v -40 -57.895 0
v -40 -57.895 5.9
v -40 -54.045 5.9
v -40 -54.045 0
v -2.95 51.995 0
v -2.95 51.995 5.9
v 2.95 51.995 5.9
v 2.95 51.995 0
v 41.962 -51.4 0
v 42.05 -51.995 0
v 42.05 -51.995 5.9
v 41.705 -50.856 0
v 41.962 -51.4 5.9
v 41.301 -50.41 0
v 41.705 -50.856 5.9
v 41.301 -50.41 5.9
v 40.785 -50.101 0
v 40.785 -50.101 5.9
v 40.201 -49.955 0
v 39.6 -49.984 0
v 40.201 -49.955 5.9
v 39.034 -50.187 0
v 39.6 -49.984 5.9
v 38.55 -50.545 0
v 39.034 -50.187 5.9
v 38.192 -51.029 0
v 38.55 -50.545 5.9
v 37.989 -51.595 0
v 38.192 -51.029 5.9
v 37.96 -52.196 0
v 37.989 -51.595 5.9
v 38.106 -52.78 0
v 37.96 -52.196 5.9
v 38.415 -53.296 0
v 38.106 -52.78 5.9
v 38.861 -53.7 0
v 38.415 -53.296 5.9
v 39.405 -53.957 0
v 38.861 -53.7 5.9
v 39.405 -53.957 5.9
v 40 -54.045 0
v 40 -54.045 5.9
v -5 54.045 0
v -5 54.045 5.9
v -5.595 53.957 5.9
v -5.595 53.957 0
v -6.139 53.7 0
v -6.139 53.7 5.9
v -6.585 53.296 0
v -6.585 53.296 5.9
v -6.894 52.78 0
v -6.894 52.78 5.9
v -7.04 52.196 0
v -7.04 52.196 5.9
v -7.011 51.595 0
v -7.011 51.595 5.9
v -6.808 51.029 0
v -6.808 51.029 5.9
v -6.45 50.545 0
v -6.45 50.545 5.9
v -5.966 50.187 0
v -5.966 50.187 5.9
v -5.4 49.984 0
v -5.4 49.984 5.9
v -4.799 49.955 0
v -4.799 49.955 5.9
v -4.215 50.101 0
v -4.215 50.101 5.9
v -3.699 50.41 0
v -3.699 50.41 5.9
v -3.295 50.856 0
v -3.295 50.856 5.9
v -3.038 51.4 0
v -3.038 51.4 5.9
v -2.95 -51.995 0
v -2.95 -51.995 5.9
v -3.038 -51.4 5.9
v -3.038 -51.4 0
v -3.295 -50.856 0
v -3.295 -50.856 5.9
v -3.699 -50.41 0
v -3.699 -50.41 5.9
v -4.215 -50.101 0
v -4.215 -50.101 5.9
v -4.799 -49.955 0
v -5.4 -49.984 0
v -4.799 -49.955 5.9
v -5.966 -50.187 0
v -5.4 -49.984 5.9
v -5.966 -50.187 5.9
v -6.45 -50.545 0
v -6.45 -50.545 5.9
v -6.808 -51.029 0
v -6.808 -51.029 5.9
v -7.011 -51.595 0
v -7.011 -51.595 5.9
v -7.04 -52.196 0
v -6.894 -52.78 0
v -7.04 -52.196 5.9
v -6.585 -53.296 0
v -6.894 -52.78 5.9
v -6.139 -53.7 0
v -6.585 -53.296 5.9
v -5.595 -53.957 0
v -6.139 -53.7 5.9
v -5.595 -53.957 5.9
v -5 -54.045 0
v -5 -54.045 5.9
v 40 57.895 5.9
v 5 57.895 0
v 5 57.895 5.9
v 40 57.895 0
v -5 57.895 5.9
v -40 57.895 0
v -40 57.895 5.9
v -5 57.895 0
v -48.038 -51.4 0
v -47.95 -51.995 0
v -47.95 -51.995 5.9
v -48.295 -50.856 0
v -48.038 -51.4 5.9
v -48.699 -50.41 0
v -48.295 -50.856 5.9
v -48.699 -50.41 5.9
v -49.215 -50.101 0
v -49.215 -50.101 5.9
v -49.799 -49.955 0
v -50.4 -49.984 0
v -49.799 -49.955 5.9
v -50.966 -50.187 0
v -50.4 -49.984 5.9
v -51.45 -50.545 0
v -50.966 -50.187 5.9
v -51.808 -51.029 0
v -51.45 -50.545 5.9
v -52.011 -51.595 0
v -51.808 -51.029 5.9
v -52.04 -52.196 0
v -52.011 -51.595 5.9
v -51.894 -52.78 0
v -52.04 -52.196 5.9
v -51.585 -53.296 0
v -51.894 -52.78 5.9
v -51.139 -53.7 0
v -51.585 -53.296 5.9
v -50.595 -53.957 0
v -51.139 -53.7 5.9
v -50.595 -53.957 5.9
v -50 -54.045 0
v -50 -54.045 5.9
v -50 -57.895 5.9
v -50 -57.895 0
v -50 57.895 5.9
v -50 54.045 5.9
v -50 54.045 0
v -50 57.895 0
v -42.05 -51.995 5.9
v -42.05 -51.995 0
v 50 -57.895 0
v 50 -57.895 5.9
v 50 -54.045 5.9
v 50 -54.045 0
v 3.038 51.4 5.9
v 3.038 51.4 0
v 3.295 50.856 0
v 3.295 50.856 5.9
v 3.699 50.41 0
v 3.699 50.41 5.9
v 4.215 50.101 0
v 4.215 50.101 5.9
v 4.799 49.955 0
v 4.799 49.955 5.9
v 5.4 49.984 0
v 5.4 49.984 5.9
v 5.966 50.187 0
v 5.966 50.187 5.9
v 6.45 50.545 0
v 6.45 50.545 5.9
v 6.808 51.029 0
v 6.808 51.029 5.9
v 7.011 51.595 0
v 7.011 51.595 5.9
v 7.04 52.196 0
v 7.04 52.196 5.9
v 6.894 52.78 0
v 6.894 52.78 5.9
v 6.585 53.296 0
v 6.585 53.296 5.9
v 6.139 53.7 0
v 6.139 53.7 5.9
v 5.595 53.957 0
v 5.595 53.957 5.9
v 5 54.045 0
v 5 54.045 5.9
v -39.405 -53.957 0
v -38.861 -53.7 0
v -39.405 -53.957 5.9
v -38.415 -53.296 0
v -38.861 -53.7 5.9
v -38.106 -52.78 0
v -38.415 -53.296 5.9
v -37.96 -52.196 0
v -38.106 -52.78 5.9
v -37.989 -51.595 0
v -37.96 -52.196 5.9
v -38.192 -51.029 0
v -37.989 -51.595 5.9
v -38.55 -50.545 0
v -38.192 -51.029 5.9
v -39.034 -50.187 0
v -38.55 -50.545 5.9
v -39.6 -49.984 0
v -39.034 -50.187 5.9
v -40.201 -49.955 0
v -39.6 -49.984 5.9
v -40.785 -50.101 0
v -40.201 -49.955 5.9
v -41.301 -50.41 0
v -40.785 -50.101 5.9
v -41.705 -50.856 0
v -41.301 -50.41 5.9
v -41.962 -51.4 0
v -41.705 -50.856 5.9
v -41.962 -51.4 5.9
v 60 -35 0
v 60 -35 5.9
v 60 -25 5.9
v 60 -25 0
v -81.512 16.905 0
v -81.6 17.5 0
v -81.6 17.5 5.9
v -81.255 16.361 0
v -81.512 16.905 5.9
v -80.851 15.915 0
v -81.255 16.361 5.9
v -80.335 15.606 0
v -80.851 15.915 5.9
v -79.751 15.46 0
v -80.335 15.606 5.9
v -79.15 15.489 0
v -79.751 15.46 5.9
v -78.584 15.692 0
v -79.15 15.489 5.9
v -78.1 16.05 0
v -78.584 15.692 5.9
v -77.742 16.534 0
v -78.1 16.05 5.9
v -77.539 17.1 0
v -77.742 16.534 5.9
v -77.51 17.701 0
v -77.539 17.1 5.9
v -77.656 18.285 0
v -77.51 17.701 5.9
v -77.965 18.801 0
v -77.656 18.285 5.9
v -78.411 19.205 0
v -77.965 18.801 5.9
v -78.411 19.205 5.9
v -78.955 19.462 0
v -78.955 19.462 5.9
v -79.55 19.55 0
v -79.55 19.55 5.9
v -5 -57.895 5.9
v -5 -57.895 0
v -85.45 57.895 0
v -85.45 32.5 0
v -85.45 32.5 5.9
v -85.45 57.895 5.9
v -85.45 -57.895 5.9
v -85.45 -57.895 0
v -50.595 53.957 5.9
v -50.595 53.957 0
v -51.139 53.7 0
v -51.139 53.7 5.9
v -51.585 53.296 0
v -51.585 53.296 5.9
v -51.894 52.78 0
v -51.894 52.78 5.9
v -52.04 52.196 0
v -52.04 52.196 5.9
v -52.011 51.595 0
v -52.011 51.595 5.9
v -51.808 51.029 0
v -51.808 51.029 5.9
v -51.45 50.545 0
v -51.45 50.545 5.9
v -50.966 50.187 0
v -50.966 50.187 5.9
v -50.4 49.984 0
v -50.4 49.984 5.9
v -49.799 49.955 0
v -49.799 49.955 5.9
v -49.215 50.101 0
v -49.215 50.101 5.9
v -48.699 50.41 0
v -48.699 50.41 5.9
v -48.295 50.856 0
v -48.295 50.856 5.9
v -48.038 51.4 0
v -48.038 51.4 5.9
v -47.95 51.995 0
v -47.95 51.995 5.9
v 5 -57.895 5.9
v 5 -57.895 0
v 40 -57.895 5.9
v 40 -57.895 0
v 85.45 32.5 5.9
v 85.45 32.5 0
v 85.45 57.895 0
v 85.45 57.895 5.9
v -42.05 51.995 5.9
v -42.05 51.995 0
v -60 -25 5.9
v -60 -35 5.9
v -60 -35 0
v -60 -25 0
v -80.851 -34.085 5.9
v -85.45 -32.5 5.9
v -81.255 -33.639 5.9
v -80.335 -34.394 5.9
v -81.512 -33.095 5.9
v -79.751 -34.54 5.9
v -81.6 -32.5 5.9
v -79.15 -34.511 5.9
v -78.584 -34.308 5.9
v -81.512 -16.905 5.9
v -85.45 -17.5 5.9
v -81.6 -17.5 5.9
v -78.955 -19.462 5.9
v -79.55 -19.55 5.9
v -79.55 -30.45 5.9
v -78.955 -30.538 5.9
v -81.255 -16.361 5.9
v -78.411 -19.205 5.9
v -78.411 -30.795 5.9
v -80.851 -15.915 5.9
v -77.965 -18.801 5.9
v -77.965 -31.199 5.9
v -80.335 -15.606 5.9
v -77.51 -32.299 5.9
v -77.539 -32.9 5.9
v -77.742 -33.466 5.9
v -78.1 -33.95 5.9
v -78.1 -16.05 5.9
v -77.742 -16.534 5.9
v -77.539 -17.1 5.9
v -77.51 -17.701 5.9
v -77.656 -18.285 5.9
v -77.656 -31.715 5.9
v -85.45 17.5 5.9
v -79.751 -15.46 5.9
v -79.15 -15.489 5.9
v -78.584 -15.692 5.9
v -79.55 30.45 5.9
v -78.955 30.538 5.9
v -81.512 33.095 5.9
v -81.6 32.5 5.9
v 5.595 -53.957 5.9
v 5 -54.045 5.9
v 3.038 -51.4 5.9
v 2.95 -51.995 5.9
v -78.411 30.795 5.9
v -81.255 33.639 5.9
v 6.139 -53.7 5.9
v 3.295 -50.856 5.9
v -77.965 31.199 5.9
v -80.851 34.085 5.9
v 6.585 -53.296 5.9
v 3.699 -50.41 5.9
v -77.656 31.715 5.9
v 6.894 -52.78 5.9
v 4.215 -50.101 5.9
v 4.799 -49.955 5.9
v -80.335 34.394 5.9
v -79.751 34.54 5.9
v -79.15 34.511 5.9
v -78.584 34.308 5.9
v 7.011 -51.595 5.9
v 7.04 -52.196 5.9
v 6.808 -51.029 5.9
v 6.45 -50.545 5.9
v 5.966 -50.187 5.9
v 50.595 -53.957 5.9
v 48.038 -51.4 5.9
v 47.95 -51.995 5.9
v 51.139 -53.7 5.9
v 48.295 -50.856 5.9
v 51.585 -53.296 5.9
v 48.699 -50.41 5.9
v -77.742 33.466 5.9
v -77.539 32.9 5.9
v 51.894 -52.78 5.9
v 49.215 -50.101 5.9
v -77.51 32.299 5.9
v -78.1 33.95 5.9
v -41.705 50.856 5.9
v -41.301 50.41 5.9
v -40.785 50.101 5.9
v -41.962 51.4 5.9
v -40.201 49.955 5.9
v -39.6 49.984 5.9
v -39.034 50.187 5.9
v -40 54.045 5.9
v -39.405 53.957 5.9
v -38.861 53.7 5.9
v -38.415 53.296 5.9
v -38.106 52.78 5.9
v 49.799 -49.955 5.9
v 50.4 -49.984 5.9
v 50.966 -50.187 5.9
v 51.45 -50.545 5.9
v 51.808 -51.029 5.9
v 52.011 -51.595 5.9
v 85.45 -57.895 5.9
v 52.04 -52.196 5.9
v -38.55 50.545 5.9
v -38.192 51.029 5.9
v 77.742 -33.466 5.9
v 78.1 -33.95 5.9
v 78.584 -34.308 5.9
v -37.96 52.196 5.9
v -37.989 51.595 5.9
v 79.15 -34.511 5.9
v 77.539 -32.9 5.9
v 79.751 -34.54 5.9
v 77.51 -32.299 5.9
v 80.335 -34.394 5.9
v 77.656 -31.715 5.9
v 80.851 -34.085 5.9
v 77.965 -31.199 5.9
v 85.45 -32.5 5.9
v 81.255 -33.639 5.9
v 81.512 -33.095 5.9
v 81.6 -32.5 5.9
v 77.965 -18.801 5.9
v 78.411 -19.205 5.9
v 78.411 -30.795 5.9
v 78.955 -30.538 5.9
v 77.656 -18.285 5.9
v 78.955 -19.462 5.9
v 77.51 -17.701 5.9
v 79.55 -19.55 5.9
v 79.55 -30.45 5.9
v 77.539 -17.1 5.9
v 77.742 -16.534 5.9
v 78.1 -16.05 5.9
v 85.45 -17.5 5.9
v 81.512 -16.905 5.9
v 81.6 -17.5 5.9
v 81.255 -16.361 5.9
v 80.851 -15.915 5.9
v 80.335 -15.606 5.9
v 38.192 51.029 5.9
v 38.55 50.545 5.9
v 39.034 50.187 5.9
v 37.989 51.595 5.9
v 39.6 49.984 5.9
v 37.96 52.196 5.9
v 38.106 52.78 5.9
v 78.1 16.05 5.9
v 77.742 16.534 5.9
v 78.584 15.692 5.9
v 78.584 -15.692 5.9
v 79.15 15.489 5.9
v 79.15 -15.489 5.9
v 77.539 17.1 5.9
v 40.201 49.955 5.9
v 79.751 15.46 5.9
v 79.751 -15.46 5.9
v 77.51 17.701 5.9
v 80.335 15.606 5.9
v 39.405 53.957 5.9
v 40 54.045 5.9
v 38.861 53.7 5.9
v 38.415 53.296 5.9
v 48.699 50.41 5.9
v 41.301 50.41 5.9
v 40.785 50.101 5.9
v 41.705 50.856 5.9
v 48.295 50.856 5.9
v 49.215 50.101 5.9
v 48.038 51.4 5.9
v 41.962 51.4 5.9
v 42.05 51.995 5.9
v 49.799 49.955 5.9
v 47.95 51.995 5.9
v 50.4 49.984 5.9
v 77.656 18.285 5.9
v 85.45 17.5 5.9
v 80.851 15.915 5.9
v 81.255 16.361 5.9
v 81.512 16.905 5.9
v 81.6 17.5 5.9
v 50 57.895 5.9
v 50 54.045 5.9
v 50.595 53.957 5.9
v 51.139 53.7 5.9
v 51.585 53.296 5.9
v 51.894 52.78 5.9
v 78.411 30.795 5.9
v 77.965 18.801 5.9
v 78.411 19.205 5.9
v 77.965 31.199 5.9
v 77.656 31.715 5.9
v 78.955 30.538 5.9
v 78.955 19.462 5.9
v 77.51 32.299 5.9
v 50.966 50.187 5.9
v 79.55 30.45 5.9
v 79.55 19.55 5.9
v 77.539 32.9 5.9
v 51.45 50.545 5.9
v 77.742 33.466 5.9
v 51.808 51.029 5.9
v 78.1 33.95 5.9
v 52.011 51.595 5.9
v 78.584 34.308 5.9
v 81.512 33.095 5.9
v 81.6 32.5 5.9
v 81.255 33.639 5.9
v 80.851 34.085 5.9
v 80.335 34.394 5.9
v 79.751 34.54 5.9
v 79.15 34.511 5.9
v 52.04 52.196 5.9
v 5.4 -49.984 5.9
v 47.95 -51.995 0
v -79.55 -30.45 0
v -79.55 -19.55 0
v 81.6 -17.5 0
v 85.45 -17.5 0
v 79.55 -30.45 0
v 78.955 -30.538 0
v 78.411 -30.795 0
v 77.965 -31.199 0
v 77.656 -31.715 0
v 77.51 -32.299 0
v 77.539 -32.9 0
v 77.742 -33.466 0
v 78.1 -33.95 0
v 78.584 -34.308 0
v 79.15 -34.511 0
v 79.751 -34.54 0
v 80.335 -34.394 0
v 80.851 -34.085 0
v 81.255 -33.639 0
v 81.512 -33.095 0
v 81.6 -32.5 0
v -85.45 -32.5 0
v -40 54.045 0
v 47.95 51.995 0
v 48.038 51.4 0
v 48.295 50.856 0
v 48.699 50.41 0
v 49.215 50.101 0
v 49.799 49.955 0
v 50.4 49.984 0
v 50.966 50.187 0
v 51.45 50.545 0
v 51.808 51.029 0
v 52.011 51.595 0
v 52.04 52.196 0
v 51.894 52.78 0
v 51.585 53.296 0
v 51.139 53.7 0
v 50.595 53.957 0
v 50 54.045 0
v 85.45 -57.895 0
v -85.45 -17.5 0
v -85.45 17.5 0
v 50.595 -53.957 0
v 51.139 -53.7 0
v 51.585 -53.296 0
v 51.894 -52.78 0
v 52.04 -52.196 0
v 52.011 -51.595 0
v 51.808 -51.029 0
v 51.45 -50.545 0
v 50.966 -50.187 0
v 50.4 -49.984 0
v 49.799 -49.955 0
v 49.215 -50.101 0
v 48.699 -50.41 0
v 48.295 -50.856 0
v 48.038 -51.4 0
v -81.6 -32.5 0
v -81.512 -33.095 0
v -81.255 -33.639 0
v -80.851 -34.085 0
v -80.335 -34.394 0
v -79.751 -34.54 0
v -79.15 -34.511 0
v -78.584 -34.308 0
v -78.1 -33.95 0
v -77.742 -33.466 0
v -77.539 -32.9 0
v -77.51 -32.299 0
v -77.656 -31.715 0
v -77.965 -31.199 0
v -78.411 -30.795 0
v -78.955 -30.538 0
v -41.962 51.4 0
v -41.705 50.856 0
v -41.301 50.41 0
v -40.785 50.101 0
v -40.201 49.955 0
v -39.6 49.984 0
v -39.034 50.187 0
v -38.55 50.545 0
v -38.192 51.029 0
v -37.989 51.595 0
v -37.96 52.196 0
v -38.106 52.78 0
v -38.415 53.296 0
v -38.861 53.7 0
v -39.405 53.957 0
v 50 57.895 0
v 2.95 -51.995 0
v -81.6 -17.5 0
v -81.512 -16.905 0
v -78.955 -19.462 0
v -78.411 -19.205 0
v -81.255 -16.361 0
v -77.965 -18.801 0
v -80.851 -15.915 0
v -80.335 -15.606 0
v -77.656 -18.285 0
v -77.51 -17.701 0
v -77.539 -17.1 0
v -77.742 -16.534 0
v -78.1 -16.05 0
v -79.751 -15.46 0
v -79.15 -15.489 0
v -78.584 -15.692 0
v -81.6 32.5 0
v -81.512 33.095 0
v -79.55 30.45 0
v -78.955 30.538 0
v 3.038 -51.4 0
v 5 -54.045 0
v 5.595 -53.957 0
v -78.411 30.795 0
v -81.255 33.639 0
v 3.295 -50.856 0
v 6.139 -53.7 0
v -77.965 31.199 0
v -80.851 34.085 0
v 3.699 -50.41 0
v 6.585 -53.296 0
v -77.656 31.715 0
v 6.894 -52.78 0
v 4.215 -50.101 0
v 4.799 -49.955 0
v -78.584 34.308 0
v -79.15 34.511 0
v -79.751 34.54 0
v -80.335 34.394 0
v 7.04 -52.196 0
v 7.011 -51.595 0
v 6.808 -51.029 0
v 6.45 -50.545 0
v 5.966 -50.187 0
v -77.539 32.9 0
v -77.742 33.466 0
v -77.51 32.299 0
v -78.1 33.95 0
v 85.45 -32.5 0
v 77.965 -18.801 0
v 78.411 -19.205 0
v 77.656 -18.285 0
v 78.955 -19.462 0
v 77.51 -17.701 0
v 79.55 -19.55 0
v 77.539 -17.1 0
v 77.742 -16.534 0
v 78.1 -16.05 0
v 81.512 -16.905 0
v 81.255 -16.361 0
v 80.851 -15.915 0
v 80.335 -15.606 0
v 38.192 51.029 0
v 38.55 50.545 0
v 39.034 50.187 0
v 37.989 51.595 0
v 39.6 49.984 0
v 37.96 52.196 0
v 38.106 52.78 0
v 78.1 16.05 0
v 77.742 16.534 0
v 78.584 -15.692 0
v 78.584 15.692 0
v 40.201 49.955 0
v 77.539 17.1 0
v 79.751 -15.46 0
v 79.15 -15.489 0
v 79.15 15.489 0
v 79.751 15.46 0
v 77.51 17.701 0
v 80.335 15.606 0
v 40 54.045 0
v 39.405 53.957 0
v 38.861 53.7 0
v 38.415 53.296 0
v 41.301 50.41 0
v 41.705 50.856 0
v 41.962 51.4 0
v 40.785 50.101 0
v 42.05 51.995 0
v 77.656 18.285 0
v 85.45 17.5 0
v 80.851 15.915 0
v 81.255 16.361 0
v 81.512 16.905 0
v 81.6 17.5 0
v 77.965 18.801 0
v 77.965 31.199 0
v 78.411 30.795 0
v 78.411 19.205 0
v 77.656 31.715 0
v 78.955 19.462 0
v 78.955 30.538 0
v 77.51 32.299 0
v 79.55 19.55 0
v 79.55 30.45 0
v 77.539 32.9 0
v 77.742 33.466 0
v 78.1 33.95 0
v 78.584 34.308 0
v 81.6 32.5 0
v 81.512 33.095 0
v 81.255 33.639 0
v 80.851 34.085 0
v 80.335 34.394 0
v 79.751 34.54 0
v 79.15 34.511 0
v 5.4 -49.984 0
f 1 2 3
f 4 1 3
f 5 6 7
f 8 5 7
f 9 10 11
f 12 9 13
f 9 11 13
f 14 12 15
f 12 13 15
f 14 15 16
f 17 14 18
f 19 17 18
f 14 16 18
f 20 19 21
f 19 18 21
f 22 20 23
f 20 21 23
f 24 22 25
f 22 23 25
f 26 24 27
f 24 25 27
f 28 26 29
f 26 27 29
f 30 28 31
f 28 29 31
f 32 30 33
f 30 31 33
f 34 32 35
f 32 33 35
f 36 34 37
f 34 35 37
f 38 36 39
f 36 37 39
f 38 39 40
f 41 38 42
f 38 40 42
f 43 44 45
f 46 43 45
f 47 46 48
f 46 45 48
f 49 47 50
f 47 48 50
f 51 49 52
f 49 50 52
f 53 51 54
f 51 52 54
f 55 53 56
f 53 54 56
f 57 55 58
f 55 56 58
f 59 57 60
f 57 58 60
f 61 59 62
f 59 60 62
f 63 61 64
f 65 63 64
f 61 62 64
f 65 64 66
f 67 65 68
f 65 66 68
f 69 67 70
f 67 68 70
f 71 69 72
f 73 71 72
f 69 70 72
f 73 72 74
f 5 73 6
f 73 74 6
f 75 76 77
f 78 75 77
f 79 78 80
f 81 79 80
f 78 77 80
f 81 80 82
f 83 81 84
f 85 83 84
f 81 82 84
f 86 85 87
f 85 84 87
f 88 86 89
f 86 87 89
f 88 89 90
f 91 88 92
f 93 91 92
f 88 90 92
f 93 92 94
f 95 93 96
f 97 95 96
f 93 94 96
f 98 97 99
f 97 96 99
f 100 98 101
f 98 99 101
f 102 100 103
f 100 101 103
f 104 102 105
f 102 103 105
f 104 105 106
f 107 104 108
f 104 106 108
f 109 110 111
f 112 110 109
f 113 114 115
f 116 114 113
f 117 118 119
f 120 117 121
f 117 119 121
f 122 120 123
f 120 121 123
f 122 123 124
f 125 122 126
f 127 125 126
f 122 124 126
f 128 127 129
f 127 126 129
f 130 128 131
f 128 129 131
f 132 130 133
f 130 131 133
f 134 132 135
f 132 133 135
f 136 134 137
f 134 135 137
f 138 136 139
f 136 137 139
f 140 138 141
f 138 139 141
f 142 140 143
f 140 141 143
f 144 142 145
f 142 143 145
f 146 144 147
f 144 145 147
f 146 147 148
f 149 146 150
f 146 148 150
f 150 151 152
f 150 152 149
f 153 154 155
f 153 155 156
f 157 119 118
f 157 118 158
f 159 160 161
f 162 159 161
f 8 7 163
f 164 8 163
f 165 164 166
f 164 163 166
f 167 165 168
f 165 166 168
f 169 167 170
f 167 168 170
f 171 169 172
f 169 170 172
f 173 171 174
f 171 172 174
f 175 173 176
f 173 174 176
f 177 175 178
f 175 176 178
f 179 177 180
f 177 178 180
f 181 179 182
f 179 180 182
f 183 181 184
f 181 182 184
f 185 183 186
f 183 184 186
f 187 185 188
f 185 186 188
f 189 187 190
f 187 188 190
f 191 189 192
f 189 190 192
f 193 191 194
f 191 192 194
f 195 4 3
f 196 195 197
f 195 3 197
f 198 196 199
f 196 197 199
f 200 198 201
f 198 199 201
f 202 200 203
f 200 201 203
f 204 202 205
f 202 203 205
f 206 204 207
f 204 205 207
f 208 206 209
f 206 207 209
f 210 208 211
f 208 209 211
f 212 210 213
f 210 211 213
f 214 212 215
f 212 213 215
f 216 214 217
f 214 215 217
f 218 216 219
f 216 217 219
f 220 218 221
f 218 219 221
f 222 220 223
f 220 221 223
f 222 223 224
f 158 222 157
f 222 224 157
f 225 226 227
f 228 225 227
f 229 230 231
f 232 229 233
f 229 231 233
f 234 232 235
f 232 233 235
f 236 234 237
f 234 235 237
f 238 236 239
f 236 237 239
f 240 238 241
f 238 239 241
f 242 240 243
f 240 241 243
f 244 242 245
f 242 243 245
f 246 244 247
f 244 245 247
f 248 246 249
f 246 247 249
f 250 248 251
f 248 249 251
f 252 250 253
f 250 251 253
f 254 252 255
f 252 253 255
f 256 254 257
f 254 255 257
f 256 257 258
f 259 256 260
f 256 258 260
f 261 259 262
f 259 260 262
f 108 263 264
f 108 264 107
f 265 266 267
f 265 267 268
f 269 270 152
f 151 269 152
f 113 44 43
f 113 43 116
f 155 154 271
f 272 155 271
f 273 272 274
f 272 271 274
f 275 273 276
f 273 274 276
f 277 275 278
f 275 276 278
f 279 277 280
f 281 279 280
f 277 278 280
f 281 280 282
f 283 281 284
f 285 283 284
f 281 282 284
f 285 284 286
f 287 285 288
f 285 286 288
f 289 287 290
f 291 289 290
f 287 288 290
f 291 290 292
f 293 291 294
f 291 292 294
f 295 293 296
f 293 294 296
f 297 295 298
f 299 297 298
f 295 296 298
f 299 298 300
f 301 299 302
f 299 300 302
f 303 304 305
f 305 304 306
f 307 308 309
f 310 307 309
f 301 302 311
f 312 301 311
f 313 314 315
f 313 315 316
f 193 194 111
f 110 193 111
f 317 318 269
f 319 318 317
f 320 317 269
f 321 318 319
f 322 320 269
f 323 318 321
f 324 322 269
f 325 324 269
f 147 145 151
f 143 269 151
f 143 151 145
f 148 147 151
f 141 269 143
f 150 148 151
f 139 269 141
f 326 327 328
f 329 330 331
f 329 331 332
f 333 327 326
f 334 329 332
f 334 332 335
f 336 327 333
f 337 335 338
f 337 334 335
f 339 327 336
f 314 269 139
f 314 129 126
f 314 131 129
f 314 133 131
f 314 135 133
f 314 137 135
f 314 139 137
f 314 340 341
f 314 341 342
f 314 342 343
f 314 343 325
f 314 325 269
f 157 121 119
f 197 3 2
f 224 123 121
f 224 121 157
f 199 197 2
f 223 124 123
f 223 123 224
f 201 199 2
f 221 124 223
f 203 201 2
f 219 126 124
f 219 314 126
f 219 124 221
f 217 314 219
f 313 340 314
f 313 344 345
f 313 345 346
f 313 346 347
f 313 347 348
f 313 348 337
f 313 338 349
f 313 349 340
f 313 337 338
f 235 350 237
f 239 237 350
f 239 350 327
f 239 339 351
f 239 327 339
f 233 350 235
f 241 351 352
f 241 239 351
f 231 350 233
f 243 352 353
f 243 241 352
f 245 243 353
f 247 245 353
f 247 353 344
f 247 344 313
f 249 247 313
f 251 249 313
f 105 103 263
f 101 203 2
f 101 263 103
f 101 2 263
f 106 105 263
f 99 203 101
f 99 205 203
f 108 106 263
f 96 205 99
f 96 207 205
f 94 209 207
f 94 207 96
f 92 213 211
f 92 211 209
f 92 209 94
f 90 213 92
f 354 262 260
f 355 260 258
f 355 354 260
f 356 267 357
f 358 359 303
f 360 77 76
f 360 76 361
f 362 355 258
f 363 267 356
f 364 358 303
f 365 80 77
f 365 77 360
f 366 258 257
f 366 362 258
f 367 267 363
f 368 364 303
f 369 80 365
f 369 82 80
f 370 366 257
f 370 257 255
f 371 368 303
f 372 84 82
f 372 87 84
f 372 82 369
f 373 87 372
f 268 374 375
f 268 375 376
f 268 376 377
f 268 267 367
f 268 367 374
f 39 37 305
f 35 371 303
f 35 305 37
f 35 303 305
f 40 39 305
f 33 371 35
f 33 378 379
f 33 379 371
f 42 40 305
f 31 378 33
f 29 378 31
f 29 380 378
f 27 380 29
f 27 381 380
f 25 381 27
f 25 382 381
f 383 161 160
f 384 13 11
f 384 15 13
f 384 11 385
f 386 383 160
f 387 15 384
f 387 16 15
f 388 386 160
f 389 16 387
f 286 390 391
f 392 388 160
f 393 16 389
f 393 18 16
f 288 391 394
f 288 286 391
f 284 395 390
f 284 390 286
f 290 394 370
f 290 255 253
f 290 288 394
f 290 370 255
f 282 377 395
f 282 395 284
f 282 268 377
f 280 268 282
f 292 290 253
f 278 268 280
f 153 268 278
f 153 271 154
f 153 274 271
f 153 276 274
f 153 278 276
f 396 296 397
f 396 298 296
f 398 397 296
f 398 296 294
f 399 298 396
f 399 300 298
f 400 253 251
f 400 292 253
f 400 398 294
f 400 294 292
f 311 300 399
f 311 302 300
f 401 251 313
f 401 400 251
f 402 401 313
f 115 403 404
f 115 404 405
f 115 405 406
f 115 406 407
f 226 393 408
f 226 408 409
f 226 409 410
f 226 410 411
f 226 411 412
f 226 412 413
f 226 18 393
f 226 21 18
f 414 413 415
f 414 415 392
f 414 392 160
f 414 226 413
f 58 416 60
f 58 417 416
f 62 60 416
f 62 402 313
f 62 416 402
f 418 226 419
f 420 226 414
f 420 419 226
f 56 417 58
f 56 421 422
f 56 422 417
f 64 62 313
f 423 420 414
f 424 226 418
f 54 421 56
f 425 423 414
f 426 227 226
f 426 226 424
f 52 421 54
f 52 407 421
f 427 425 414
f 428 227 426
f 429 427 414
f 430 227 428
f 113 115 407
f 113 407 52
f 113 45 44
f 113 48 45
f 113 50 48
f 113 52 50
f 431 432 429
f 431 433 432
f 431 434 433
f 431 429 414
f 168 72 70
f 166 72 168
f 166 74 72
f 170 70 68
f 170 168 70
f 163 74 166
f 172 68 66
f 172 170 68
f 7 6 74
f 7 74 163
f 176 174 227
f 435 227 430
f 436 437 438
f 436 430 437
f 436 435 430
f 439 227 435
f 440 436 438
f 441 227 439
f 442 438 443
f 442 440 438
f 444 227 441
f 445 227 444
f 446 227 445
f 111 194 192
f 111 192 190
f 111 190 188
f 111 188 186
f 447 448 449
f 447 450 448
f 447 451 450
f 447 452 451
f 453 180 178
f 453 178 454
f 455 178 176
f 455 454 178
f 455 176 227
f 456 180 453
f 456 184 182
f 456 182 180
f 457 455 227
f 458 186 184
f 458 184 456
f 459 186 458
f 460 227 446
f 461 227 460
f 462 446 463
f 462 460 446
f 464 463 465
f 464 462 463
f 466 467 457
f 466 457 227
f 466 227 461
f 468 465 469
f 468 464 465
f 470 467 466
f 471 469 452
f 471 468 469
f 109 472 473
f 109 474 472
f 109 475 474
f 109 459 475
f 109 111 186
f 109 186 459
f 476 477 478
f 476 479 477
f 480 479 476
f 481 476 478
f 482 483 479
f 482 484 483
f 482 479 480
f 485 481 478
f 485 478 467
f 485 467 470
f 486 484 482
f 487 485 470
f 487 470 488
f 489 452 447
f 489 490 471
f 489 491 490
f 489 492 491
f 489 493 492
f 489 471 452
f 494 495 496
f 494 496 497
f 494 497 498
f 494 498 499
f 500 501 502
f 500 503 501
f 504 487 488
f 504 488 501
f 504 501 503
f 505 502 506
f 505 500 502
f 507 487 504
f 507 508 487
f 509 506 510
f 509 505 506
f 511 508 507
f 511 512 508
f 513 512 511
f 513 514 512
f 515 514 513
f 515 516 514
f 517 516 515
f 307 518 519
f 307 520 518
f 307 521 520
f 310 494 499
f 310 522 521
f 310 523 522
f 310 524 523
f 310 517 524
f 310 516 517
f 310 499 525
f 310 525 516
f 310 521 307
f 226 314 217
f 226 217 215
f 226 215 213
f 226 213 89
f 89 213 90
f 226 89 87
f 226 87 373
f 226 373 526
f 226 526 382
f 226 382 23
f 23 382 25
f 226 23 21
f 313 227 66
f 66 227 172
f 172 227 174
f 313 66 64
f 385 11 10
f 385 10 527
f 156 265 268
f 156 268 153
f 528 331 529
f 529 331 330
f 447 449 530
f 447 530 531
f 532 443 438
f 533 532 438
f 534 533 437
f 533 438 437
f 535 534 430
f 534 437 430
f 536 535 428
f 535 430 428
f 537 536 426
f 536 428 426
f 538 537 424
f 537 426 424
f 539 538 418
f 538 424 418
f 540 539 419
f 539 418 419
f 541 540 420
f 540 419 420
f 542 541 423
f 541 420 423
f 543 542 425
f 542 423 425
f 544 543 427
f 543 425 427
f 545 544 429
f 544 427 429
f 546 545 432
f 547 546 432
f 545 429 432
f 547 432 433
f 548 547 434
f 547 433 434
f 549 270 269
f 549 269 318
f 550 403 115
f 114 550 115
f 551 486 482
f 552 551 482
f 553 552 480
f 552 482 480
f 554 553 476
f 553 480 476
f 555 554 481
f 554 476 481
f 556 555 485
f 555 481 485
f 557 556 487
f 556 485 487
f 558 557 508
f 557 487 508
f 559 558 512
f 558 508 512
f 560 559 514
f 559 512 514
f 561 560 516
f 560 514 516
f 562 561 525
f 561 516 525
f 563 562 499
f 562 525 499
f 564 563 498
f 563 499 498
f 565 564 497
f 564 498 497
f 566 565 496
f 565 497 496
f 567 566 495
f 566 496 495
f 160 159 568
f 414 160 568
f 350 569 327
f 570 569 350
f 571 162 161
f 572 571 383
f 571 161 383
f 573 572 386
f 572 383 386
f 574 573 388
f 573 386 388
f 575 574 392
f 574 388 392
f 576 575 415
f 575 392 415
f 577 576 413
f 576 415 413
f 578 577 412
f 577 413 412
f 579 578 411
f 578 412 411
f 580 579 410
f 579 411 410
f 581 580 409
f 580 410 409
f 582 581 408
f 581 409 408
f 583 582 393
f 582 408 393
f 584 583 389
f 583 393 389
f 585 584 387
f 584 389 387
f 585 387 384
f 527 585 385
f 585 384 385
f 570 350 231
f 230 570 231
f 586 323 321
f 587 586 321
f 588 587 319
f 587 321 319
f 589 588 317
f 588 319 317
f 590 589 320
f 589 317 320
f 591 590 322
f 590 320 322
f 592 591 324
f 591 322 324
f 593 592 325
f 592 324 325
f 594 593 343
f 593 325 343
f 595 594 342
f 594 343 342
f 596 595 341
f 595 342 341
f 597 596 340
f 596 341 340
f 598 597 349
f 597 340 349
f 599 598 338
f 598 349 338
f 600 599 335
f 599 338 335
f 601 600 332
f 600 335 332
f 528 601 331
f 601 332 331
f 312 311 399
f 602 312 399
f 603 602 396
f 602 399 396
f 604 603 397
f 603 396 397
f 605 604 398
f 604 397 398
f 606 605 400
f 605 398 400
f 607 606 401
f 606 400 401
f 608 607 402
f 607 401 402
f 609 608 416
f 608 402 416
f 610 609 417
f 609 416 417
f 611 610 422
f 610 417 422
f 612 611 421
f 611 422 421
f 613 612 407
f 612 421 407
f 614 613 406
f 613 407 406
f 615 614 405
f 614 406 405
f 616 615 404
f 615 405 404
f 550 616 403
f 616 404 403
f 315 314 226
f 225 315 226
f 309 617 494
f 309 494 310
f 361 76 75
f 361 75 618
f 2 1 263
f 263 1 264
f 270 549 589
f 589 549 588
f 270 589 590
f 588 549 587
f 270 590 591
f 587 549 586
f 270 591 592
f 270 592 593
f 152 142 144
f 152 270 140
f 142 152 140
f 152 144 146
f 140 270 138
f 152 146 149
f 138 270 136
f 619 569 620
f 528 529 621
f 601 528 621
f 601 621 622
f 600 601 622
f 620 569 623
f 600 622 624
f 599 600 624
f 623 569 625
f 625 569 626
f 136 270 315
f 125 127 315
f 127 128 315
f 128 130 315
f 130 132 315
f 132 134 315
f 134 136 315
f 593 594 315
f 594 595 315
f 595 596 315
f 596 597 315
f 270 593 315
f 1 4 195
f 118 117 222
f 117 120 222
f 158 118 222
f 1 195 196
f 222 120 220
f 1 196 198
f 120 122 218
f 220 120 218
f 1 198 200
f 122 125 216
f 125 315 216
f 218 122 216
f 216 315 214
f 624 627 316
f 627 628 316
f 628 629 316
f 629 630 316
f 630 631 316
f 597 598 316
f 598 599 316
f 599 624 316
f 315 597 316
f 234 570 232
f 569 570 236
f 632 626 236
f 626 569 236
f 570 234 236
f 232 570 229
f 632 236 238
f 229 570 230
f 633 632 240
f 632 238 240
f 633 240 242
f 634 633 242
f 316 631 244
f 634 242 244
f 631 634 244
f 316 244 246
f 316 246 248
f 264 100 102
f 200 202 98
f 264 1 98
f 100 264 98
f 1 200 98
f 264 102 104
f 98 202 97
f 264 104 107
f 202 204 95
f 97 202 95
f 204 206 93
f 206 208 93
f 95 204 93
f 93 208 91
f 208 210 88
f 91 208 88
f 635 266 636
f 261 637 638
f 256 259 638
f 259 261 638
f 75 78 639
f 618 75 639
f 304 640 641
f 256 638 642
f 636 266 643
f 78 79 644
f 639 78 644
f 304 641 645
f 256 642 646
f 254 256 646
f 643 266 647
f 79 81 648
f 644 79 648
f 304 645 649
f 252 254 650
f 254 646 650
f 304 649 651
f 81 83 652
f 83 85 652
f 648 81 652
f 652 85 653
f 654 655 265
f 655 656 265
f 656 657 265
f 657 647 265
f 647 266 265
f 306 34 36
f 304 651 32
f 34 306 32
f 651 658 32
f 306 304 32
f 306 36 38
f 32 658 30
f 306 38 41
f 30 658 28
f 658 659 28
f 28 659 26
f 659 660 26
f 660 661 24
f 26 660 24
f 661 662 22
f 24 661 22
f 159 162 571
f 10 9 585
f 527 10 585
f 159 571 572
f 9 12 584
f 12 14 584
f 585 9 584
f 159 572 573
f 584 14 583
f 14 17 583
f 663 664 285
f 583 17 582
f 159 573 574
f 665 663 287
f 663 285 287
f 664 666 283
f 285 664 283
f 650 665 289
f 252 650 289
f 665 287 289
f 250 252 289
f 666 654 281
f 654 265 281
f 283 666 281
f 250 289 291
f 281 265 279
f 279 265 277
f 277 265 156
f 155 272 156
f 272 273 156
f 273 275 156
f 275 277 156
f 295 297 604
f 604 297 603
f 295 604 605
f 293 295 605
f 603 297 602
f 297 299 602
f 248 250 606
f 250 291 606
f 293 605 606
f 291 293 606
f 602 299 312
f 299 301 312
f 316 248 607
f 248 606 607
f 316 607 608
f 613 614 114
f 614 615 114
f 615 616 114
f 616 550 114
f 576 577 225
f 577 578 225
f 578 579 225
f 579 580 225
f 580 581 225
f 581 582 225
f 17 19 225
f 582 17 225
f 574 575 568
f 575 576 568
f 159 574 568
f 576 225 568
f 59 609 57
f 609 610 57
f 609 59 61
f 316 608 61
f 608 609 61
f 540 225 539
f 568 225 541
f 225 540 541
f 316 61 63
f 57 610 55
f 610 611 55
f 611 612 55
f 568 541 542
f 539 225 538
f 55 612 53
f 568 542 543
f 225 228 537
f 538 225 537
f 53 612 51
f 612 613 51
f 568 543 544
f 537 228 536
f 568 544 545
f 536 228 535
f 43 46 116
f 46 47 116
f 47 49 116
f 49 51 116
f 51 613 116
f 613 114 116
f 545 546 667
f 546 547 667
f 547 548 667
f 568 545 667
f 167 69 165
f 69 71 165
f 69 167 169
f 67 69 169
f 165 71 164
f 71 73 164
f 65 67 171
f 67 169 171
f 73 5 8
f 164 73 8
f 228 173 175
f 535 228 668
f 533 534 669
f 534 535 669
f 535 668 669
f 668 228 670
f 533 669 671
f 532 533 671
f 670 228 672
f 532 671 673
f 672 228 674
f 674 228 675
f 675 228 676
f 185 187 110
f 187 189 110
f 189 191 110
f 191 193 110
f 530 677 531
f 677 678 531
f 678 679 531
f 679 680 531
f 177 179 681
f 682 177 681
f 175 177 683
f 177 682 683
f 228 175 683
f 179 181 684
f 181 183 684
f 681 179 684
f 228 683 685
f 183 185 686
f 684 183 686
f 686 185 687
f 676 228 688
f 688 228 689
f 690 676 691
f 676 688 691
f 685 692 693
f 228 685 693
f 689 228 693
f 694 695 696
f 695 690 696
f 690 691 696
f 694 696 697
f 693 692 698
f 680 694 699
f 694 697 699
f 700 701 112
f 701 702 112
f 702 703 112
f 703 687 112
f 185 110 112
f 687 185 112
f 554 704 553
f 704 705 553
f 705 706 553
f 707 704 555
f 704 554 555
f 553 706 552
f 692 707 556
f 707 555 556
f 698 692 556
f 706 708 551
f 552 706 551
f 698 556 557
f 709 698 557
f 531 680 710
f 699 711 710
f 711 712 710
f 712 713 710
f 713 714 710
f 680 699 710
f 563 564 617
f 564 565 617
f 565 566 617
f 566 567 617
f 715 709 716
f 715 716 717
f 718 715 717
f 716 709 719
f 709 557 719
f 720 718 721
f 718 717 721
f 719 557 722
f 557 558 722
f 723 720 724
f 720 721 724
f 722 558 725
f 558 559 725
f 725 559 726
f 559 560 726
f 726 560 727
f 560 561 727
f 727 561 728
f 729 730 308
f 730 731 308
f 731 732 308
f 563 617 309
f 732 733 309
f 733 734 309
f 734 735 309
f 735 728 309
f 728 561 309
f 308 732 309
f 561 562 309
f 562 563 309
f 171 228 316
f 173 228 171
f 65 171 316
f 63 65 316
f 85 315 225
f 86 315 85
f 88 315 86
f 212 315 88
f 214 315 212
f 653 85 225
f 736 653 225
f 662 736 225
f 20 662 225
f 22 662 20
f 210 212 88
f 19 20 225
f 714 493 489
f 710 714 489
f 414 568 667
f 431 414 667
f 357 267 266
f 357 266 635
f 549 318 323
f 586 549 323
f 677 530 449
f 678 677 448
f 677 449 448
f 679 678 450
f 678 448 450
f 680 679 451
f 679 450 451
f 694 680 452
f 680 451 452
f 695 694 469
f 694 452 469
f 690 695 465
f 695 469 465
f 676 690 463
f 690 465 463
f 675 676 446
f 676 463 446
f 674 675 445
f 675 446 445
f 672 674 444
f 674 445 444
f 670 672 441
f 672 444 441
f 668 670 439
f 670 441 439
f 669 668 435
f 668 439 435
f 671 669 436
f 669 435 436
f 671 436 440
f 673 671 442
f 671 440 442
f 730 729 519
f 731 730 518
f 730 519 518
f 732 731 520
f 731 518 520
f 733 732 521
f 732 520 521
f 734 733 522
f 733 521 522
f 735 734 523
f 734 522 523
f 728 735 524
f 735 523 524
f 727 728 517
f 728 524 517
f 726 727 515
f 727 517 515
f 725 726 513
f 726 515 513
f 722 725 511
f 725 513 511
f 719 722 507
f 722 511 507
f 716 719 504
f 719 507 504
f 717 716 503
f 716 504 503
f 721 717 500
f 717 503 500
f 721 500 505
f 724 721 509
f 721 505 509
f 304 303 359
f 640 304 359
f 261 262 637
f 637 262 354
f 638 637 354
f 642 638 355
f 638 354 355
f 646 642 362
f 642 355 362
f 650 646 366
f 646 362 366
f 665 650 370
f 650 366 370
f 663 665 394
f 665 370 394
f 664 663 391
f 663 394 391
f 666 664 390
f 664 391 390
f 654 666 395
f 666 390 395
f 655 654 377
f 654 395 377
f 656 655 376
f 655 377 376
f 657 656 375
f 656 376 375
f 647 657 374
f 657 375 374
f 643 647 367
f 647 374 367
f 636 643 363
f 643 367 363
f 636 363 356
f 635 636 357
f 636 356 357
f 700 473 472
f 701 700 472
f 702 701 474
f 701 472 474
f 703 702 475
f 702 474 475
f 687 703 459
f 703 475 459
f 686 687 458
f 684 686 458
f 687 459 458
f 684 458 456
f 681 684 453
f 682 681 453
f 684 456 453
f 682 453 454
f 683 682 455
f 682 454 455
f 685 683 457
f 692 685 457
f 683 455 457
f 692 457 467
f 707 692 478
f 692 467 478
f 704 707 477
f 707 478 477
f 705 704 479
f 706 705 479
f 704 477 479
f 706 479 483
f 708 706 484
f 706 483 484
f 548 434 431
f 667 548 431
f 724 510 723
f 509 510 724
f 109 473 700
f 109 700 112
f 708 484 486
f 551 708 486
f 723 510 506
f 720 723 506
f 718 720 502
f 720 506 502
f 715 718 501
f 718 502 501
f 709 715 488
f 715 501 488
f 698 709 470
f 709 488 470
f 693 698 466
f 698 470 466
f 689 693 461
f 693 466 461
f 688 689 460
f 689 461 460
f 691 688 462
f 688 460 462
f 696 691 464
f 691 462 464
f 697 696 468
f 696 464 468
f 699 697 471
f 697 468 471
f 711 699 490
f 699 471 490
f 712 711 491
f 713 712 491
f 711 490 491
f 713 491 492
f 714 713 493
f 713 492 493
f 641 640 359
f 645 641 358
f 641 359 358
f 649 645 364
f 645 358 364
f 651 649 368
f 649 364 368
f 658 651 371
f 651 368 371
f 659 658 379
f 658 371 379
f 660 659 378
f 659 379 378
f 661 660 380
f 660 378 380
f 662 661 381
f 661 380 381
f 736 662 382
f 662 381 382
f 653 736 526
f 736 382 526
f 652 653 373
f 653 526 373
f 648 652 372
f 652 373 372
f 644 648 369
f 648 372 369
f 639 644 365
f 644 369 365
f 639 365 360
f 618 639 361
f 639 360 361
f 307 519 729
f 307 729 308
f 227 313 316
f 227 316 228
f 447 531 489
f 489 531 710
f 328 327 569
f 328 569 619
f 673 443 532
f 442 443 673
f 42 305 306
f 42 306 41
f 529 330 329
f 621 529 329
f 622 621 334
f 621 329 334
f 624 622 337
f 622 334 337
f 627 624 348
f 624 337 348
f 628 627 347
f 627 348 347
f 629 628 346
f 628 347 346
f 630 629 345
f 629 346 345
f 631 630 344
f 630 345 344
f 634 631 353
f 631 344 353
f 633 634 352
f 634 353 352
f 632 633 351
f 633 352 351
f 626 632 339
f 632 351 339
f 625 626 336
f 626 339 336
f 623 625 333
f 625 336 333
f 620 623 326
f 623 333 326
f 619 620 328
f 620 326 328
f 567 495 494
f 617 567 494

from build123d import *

# Parameters (mm, degrees)
SKETCH1_W           = 170.9
SKETCH1_H           = 115.79
BOSS_EXTRUDE1_DEPTH = 5.9
SKETCH2_W           = 5.9
SKETCH2_H           = 15
SKETCH2_W_2         = 10
SKETCH2_H_2         = 5.9
CUT_EXTRUDE1_DEPTH  = 6.9
CUT_EXTRUDE2_REACH  = 7.9
SKETCH4_W           = 120
SKETCH4_H           = 10
CUT_EXTRUDE3_REACH  = 7.9
SKETCH5_R           = 2.05


with BuildPart() as part:
    # Sketch1 → Boss-Extrude1 (new body)
    with BuildSketch(Plane.XY):
        Rectangle(SKETCH1_W, SKETCH1_H)
    extrude(amount=BOSS_EXTRUDE1_DEPTH)

    # Sketch2 → Cut-Extrude1 (cut, through all)
    with BuildSketch(Plane.XY.offset(5.9)):
        with Locations((-82.5, 25)):
            Rectangle(SKETCH2_W, SKETCH2_H)
        with Locations((-82.5, -25)):
            Rectangle(SKETCH2_W, SKETCH2_H)
        with Locations((82.5, -25)):
            Rectangle(SKETCH2_W, SKETCH2_H)
        with Locations((82.5, 25)):
            Rectangle(SKETCH2_W, SKETCH2_H)
        with Locations((-45, 54.945)):
            Rectangle(SKETCH2_W_2, SKETCH2_H_2)
        with Locations((0, 54.945)):
            Rectangle(SKETCH2_W_2, SKETCH2_H_2)
        with Locations((45, 54.945)):
            Rectangle(SKETCH2_W_2, SKETCH2_H_2)
        with Locations((45, -54.945)):
            Rectangle(SKETCH2_W_2, SKETCH2_H_2)
        with Locations((0, -54.945)):
            Rectangle(SKETCH2_W_2, SKETCH2_H_2)
        with Locations((-45, -54.945)):
            Rectangle(SKETCH2_W_2, SKETCH2_H_2)
    extrude(amount=-CUT_EXTRUDE1_DEPTH, mode=Mode.SUBTRACT)

    # Sketch4 → Cut-Extrude2 (cut, up to next)
    with BuildSketch(Plane.XY.offset(5.9), mode=Mode.PRIVATE) as cut_extrude2_sk1:
        with Locations((0, -30)):
            Rectangle(SKETCH4_W, SKETCH4_H)
    cut_extrude2_tool1 = extrude(cut_extrude2_sk1.sketch, amount=-CUT_EXTRUDE2_REACH, mode=Mode.PRIVATE) & part.part
    add(cut_extrude2_tool1.solids().sort_by_distance((0, -30, 5.9))[0], mode=Mode.SUBTRACT)

    # Sketch5 → Cut-Extrude3 (cut, up to next)
    with BuildSketch(Plane.XY.offset(5.9), mode=Mode.PRIVATE) as cut_extrude3_sk1:
        with Locations((-50, 51.995)):
            Circle(SKETCH5_R)
    cut_extrude3_tool1 = extrude(cut_extrude3_sk1.sketch, amount=-CUT_EXTRUDE3_REACH, mode=Mode.PRIVATE) & part.part
    add(cut_extrude3_tool1.solids().sort_by_distance((-50, 51.995, 5.9))[0], mode=Mode.SUBTRACT)
    # Sketch5 → Cut-Extrude3 (cut, up to next)
    with BuildSketch(Plane.XY.offset(5.9), mode=Mode.PRIVATE) as cut_extrude3_sk2:
        with Locations((-40, 51.995)):
            Circle(SKETCH5_R)
    cut_extrude3_tool2 = extrude(cut_extrude3_sk2.sketch, amount=-CUT_EXTRUDE3_REACH, mode=Mode.PRIVATE) & part.part
    add(cut_extrude3_tool2.solids().sort_by_distance((-40, 51.995, 5.9))[0], mode=Mode.SUBTRACT)
    # Sketch5 → Cut-Extrude3 (cut, up to next)
    with BuildSketch(Plane.XY.offset(5.9), mode=Mode.PRIVATE) as cut_extrude3_sk3:
        with Locations((-5, 51.995)):
            Circle(SKETCH5_R)
    cut_extrude3_tool3 = extrude(cut_extrude3_sk3.sketch, amount=-CUT_EXTRUDE3_REACH, mode=Mode.PRIVATE) & part.part
    add(cut_extrude3_tool3.solids().sort_by_distance((-5, 51.995, 5.9))[0], mode=Mode.SUBTRACT)
    # Sketch5 → Cut-Extrude3 (cut, up to next)
    with BuildSketch(Plane.XY.offset(5.9), mode=Mode.PRIVATE) as cut_extrude3_sk4:
        with Locations((5, 51.995)):
            Circle(SKETCH5_R)
    cut_extrude3_tool4 = extrude(cut_extrude3_sk4.sketch, amount=-CUT_EXTRUDE3_REACH, mode=Mode.PRIVATE) & part.part
    add(cut_extrude3_tool4.solids().sort_by_distance((5, 51.995, 5.9))[0], mode=Mode.SUBTRACT)
    # Sketch5 → Cut-Extrude3 (cut, up to next)
    with BuildSketch(Plane.XY.offset(5.9), mode=Mode.PRIVATE) as cut_extrude3_sk5:
        with Locations((40, 51.995)):
            Circle(SKETCH5_R)
    cut_extrude3_tool5 = extrude(cut_extrude3_sk5.sketch, amount=-CUT_EXTRUDE3_REACH, mode=Mode.PRIVATE) & part.part
    add(cut_extrude3_tool5.solids().sort_by_distance((40, 51.995, 5.9))[0], mode=Mode.SUBTRACT)
    # Sketch5 → Cut-Extrude3 (cut, up to next)
    with BuildSketch(Plane.XY.offset(5.9), mode=Mode.PRIVATE) as cut_extrude3_sk6:
        with Locations((50, 51.995)):
            Circle(SKETCH5_R)
    cut_extrude3_tool6 = extrude(cut_extrude3_sk6.sketch, amount=-CUT_EXTRUDE3_REACH, mode=Mode.PRIVATE) & part.part
    add(cut_extrude3_tool6.solids().sort_by_distance((50, 51.995, 5.9))[0], mode=Mode.SUBTRACT)
    # Sketch5 → Cut-Extrude3 (cut, up to next)
    with BuildSketch(Plane.XY.offset(5.9), mode=Mode.PRIVATE) as cut_extrude3_sk7:
        with Locations((79.55, 32.5)):
            Circle(SKETCH5_R)
    cut_extrude3_tool7 = extrude(cut_extrude3_sk7.sketch, amount=-CUT_EXTRUDE3_REACH, mode=Mode.PRIVATE) & part.part
    add(cut_extrude3_tool7.solids().sort_by_distance((79.55, 32.5, 5.9))[0], mode=Mode.SUBTRACT)
    # Sketch5 → Cut-Extrude3 (cut, up to next)
    with BuildSketch(Plane.XY.offset(5.9), mode=Mode.PRIVATE) as cut_extrude3_sk8:
        with Locations((79.55, 17.5)):
            Circle(SKETCH5_R)
    cut_extrude3_tool8 = extrude(cut_extrude3_sk8.sketch, amount=-CUT_EXTRUDE3_REACH, mode=Mode.PRIVATE) & part.part
    add(cut_extrude3_tool8.solids().sort_by_distance((79.55, 17.5, 5.9))[0], mode=Mode.SUBTRACT)
    # Sketch5 → Cut-Extrude3 (cut, up to next)
    with BuildSketch(Plane.XY.offset(5.9), mode=Mode.PRIVATE) as cut_extrude3_sk9:
        with Locations((79.55, -17.5)):
            Circle(SKETCH5_R)
    cut_extrude3_tool9 = extrude(cut_extrude3_sk9.sketch, amount=-CUT_EXTRUDE3_REACH, mode=Mode.PRIVATE) & part.part
    add(cut_extrude3_tool9.solids().sort_by_distance((79.55, -17.5, 5.9))[0], mode=Mode.SUBTRACT)
    # Sketch5 → Cut-Extrude3 (cut, up to next)
    with BuildSketch(Plane.XY.offset(5.9), mode=Mode.PRIVATE) as cut_extrude3_sk10:
        with Locations((79.55, -32.5)):
            Circle(SKETCH5_R)
    cut_extrude3_tool10 = extrude(cut_extrude3_sk10.sketch, amount=-CUT_EXTRUDE3_REACH, mode=Mode.PRIVATE) & part.part
    add(cut_extrude3_tool10.solids().sort_by_distance((79.55, -32.5, 5.9))[0], mode=Mode.SUBTRACT)
    # Sketch5 → Cut-Extrude3 (cut, up to next)
    with BuildSketch(Plane.XY.offset(5.9), mode=Mode.PRIVATE) as cut_extrude3_sk11:
        with Locations((-40, -51.995)):
            Circle(SKETCH5_R)
    cut_extrude3_tool11 = extrude(cut_extrude3_sk11.sketch, amount=-CUT_EXTRUDE3_REACH, mode=Mode.PRIVATE) & part.part
    add(cut_extrude3_tool11.solids().sort_by_distance((-40, -51.995, 5.9))[0], mode=Mode.SUBTRACT)
    # Sketch5 → Cut-Extrude3 (cut, up to next)
    with BuildSketch(Plane.XY.offset(5.9), mode=Mode.PRIVATE) as cut_extrude3_sk12:
        with Locations((-5, -51.995)):
            Circle(SKETCH5_R)
    cut_extrude3_tool12 = extrude(cut_extrude3_sk12.sketch, amount=-CUT_EXTRUDE3_REACH, mode=Mode.PRIVATE) & part.part
    add(cut_extrude3_tool12.solids().sort_by_distance((-5, -51.995, 5.9))[0], mode=Mode.SUBTRACT)
    # Sketch5 → Cut-Extrude3 (cut, up to next)
    with BuildSketch(Plane.XY.offset(5.9), mode=Mode.PRIVATE) as cut_extrude3_sk13:
        with Locations((5, -51.995)):
            Circle(SKETCH5_R)
    cut_extrude3_tool13 = extrude(cut_extrude3_sk13.sketch, amount=-CUT_EXTRUDE3_REACH, mode=Mode.PRIVATE) & part.part
    add(cut_extrude3_tool13.solids().sort_by_distance((5, -51.995, 5.9))[0], mode=Mode.SUBTRACT)
    # Sketch5 → Cut-Extrude3 (cut, up to next)
    with BuildSketch(Plane.XY.offset(5.9), mode=Mode.PRIVATE) as cut_extrude3_sk14:
        with Locations((40, -51.995)):
            Circle(SKETCH5_R)
    cut_extrude3_tool14 = extrude(cut_extrude3_sk14.sketch, amount=-CUT_EXTRUDE3_REACH, mode=Mode.PRIVATE) & part.part
    add(cut_extrude3_tool14.solids().sort_by_distance((40, -51.995, 5.9))[0], mode=Mode.SUBTRACT)
    # Sketch5 → Cut-Extrude3 (cut, up to next)
    with BuildSketch(Plane.XY.offset(5.9), mode=Mode.PRIVATE) as cut_extrude3_sk15:
        with Locations((50, -51.995)):
            Circle(SKETCH5_R)
    cut_extrude3_tool15 = extrude(cut_extrude3_sk15.sketch, amount=-CUT_EXTRUDE3_REACH, mode=Mode.PRIVATE) & part.part
    add(cut_extrude3_tool15.solids().sort_by_distance((50, -51.995, 5.9))[0], mode=Mode.SUBTRACT)
    # Sketch5 → Cut-Extrude3 (cut, up to next)
    with BuildSketch(Plane.XY.offset(5.9), mode=Mode.PRIVATE) as cut_extrude3_sk16:
        with Locations((-50, -51.995)):
            Circle(SKETCH5_R)
    cut_extrude3_tool16 = extrude(cut_extrude3_sk16.sketch, amount=-CUT_EXTRUDE3_REACH, mode=Mode.PRIVATE) & part.part
    add(cut_extrude3_tool16.solids().sort_by_distance((-50, -51.995, 5.9))[0], mode=Mode.SUBTRACT)
    # Sketch5 → Cut-Extrude3 (cut, up to next)
    with BuildSketch(Plane.XY.offset(5.9), mode=Mode.PRIVATE) as cut_extrude3_sk17:
        with Locations((-79.55, -32.5)):
            Circle(SKETCH5_R)
    cut_extrude3_tool17 = extrude(cut_extrude3_sk17.sketch, amount=-CUT_EXTRUDE3_REACH, mode=Mode.PRIVATE) & part.part
    add(cut_extrude3_tool17.solids().sort_by_distance((-79.55, -32.5, 5.9))[0], mode=Mode.SUBTRACT)
    # Sketch5 → Cut-Extrude3 (cut, up to next)
    with BuildSketch(Plane.XY.offset(5.9), mode=Mode.PRIVATE) as cut_extrude3_sk18:
        with Locations((-79.55, -17.5)):
            Circle(SKETCH5_R)
    cut_extrude3_tool18 = extrude(cut_extrude3_sk18.sketch, amount=-CUT_EXTRUDE3_REACH, mode=Mode.PRIVATE) & part.part
    add(cut_extrude3_tool18.solids().sort_by_distance((-79.55, -17.5, 5.9))[0], mode=Mode.SUBTRACT)
    # Sketch5 → Cut-Extrude3 (cut, up to next)
    with BuildSketch(Plane.XY.offset(5.9), mode=Mode.PRIVATE) as cut_extrude3_sk19:
        with Locations((-79.55, 17.5)):
            Circle(SKETCH5_R)
    cut_extrude3_tool19 = extrude(cut_extrude3_sk19.sketch, amount=-CUT_EXTRUDE3_REACH, mode=Mode.PRIVATE) & part.part
    add(cut_extrude3_tool19.solids().sort_by_distance((-79.55, 17.5, 5.9))[0], mode=Mode.SUBTRACT)
    # Sketch5 → Cut-Extrude3 (cut, up to next)
    with BuildSketch(Plane.XY.offset(5.9), mode=Mode.PRIVATE) as cut_extrude3_sk20:
        with Locations((-79.55, 32.5)):
            Circle(SKETCH5_R)
    cut_extrude3_tool20 = extrude(cut_extrude3_sk20.sketch, amount=-CUT_EXTRUDE3_REACH, mode=Mode.PRIVATE) & part.part
    add(cut_extrude3_tool20.solids().sort_by_distance((-79.55, 32.5, 5.9))[0], mode=Mode.SUBTRACT)


solid = part.part
